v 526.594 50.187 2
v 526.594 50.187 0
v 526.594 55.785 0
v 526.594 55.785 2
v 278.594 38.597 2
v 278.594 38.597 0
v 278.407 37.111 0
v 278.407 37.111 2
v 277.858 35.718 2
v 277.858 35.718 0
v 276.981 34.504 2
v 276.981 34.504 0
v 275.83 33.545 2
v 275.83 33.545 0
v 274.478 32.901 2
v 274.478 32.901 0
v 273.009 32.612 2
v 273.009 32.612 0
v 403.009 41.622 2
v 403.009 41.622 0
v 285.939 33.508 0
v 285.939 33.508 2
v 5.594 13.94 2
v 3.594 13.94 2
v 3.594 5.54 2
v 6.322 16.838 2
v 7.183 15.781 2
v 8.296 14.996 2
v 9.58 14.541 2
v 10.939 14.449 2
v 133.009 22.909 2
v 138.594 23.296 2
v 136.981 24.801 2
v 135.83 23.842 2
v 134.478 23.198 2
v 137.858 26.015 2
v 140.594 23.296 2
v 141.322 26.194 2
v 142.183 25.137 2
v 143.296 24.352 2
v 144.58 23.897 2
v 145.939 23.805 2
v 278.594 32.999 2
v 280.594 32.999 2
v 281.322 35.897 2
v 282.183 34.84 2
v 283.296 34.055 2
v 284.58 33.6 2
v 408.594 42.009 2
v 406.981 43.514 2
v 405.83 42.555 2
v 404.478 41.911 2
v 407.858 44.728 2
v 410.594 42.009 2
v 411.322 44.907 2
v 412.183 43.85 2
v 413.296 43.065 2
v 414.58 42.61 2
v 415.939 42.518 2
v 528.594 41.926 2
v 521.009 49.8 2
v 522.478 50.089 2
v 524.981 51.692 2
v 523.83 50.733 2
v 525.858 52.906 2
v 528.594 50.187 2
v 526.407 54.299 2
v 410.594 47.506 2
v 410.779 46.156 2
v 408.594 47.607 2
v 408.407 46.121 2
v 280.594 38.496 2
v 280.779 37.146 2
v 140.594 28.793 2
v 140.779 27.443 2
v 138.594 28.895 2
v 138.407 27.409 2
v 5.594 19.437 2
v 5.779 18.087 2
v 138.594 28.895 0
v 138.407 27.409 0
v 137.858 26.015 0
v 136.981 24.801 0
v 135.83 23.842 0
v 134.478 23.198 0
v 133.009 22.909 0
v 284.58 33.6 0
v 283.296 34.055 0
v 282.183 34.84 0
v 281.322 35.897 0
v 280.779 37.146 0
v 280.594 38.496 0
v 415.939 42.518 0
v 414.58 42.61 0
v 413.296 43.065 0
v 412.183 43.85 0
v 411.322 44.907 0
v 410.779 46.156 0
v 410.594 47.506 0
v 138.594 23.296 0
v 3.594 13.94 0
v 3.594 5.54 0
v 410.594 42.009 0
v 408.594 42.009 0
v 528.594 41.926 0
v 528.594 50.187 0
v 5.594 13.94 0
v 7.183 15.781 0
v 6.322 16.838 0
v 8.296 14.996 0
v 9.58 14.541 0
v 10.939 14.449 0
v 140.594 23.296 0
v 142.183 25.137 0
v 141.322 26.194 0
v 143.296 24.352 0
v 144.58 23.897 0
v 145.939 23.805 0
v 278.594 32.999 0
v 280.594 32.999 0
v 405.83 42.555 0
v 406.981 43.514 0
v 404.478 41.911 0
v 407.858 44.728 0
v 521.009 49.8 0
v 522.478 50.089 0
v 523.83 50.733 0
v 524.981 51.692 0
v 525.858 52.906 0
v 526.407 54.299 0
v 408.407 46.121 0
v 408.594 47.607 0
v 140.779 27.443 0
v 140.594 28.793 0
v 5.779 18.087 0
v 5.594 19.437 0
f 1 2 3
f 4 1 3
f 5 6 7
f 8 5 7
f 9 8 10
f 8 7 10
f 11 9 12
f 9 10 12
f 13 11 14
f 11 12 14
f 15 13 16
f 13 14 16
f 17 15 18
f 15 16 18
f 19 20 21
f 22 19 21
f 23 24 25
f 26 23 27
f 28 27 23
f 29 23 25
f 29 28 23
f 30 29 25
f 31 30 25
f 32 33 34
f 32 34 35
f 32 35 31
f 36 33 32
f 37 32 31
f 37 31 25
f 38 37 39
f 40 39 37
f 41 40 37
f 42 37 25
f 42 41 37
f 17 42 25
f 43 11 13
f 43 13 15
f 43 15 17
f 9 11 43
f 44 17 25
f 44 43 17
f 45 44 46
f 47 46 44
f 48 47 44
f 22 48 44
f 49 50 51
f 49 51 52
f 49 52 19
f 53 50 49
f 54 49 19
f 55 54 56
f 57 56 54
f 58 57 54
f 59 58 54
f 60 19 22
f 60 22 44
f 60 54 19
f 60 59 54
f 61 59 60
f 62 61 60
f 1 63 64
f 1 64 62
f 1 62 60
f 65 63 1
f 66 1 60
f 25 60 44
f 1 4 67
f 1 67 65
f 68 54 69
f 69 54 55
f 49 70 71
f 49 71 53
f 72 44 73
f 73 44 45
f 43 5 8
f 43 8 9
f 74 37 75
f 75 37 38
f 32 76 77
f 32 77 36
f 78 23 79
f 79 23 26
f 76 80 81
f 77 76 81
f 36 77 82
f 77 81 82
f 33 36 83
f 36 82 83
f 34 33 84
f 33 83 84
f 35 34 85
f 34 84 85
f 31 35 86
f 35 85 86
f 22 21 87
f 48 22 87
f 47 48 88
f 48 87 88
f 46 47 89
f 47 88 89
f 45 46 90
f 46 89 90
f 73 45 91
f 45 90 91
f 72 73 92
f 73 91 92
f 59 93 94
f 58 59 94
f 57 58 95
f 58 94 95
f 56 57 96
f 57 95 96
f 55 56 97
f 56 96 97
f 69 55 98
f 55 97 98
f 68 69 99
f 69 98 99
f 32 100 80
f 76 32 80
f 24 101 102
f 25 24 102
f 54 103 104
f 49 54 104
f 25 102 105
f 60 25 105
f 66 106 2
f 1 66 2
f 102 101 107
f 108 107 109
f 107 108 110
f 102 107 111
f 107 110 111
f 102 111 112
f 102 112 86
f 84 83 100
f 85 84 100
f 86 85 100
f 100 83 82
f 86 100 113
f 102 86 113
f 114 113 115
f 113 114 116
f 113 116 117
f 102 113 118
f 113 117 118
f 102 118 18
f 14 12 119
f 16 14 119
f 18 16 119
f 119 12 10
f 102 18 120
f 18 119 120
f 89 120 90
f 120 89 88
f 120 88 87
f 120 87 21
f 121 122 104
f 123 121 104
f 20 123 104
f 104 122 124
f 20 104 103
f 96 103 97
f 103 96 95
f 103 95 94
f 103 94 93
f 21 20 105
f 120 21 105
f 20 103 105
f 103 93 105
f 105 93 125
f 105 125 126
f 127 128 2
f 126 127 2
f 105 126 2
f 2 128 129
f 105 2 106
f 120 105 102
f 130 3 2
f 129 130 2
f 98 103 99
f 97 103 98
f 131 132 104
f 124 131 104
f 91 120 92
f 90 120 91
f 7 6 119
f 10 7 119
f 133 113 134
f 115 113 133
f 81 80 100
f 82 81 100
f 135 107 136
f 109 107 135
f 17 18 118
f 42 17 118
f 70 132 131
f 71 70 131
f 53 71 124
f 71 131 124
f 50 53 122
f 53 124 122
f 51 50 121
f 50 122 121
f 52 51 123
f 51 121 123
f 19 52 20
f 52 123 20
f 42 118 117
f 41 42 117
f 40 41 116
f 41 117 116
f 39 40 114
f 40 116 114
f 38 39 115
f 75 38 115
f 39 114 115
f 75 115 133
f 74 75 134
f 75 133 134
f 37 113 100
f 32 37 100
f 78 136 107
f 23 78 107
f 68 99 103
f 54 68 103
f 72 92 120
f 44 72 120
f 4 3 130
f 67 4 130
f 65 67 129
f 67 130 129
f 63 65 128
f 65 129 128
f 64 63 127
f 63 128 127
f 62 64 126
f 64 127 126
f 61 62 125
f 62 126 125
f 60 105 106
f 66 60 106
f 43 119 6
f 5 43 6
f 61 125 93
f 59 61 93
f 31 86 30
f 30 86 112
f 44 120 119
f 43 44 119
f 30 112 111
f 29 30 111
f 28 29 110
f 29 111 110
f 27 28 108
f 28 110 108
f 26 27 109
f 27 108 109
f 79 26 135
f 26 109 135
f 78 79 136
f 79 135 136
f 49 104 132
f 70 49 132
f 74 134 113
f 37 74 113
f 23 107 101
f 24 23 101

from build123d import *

# Parameters (mm, degrees)
EXTRUDE_1_DEPTH = 2


with BuildPart() as part:
    # 草图1 → 凸台-拉伸1 (new body)
    with BuildSketch(Plane.XY):
        with BuildLine():
            Line((5.593665372, 13.939609945), (3.593665372, 13.939609945))
            Line((3.593665372, 13.939609945), (3.593665372, 5.539609945))
            Line((3.593665372, 5.539609945), (528.593665372, 41.925528217))
            Line((528.593665372, 41.925528217), (528.593665372, 50.186915195))
            Line((528.593665372, 50.186915195), (526.593665372, 50.186915195))
            Line((526.593665372, 50.186915195), (526.593665372, 55.785469044))
            ThreePointArc((526.593665372, 55.785469044), (524.980524361, 51.692124664), (521.008509302, 49.799827515))
            Line((521.008509302, 49.799827515), (415.939368647, 42.517851963))
            ThreePointArc((415.939368647, 42.517851963), (412.182545056, 43.850170746), (410.593665372, 47.50588657))
            Line((410.593665372, 47.50588657), (410.593665372, 42.008746898))
            Line((410.593665372, 42.008746898), (408.593665372, 42.008746898))
            Line((408.593665372, 42.008746898), (408.593665372, 47.607300746))
            ThreePointArc((408.593665372, 47.607300746), (406.980524361, 43.513956367), (403.008509302, 41.621659217))
            Line((403.008509302, 41.621659217), (285.939368647, 33.508005533))
            ThreePointArc((285.939368647, 33.508005533), (282.182545056, 34.840324317), (280.593665372, 38.496040141))
            Line((280.593665372, 38.496040141), (280.593665372, 32.998900469))
            Line((280.593665372, 32.998900469), (278.593665372, 32.998900469))
            Line((278.593665372, 32.998900469), (278.593665372, 38.597454317))
            ThreePointArc((278.593665372, 38.597454317), (276.980524361, 34.504109938), (273.008509302, 32.611812788))
            Line((273.008509302, 32.611812788), (145.939368647, 23.805093994))
            ThreePointArc((145.939368647, 23.805093994), (142.182545056, 25.137412778), (140.593665372, 28.793128602))
            Line((140.593665372, 28.793128602), (140.593665372, 23.29598893))
            Line((140.593665372, 23.29598893), (138.593665372, 23.29598893))
            Line((138.593665372, 23.29598893), (138.593665372, 28.894542778))
            ThreePointArc((138.593665372, 28.894542778), (136.980524361, 24.801198399), (133.008509302, 22.908901249))
            Line((133.008509302, 22.908901249), (10.939368647, 14.44871501))
            ThreePointArc((10.939368647, 14.44871501), (7.182545056, 15.781033793), (5.593665372, 19.436749618))
            Line((5.593665372, 19.436749618), (5.593665372, 13.939609945))
        make_face()
    extrude(amount=EXTRUDE_1_DEPTH)


solid = part.part
